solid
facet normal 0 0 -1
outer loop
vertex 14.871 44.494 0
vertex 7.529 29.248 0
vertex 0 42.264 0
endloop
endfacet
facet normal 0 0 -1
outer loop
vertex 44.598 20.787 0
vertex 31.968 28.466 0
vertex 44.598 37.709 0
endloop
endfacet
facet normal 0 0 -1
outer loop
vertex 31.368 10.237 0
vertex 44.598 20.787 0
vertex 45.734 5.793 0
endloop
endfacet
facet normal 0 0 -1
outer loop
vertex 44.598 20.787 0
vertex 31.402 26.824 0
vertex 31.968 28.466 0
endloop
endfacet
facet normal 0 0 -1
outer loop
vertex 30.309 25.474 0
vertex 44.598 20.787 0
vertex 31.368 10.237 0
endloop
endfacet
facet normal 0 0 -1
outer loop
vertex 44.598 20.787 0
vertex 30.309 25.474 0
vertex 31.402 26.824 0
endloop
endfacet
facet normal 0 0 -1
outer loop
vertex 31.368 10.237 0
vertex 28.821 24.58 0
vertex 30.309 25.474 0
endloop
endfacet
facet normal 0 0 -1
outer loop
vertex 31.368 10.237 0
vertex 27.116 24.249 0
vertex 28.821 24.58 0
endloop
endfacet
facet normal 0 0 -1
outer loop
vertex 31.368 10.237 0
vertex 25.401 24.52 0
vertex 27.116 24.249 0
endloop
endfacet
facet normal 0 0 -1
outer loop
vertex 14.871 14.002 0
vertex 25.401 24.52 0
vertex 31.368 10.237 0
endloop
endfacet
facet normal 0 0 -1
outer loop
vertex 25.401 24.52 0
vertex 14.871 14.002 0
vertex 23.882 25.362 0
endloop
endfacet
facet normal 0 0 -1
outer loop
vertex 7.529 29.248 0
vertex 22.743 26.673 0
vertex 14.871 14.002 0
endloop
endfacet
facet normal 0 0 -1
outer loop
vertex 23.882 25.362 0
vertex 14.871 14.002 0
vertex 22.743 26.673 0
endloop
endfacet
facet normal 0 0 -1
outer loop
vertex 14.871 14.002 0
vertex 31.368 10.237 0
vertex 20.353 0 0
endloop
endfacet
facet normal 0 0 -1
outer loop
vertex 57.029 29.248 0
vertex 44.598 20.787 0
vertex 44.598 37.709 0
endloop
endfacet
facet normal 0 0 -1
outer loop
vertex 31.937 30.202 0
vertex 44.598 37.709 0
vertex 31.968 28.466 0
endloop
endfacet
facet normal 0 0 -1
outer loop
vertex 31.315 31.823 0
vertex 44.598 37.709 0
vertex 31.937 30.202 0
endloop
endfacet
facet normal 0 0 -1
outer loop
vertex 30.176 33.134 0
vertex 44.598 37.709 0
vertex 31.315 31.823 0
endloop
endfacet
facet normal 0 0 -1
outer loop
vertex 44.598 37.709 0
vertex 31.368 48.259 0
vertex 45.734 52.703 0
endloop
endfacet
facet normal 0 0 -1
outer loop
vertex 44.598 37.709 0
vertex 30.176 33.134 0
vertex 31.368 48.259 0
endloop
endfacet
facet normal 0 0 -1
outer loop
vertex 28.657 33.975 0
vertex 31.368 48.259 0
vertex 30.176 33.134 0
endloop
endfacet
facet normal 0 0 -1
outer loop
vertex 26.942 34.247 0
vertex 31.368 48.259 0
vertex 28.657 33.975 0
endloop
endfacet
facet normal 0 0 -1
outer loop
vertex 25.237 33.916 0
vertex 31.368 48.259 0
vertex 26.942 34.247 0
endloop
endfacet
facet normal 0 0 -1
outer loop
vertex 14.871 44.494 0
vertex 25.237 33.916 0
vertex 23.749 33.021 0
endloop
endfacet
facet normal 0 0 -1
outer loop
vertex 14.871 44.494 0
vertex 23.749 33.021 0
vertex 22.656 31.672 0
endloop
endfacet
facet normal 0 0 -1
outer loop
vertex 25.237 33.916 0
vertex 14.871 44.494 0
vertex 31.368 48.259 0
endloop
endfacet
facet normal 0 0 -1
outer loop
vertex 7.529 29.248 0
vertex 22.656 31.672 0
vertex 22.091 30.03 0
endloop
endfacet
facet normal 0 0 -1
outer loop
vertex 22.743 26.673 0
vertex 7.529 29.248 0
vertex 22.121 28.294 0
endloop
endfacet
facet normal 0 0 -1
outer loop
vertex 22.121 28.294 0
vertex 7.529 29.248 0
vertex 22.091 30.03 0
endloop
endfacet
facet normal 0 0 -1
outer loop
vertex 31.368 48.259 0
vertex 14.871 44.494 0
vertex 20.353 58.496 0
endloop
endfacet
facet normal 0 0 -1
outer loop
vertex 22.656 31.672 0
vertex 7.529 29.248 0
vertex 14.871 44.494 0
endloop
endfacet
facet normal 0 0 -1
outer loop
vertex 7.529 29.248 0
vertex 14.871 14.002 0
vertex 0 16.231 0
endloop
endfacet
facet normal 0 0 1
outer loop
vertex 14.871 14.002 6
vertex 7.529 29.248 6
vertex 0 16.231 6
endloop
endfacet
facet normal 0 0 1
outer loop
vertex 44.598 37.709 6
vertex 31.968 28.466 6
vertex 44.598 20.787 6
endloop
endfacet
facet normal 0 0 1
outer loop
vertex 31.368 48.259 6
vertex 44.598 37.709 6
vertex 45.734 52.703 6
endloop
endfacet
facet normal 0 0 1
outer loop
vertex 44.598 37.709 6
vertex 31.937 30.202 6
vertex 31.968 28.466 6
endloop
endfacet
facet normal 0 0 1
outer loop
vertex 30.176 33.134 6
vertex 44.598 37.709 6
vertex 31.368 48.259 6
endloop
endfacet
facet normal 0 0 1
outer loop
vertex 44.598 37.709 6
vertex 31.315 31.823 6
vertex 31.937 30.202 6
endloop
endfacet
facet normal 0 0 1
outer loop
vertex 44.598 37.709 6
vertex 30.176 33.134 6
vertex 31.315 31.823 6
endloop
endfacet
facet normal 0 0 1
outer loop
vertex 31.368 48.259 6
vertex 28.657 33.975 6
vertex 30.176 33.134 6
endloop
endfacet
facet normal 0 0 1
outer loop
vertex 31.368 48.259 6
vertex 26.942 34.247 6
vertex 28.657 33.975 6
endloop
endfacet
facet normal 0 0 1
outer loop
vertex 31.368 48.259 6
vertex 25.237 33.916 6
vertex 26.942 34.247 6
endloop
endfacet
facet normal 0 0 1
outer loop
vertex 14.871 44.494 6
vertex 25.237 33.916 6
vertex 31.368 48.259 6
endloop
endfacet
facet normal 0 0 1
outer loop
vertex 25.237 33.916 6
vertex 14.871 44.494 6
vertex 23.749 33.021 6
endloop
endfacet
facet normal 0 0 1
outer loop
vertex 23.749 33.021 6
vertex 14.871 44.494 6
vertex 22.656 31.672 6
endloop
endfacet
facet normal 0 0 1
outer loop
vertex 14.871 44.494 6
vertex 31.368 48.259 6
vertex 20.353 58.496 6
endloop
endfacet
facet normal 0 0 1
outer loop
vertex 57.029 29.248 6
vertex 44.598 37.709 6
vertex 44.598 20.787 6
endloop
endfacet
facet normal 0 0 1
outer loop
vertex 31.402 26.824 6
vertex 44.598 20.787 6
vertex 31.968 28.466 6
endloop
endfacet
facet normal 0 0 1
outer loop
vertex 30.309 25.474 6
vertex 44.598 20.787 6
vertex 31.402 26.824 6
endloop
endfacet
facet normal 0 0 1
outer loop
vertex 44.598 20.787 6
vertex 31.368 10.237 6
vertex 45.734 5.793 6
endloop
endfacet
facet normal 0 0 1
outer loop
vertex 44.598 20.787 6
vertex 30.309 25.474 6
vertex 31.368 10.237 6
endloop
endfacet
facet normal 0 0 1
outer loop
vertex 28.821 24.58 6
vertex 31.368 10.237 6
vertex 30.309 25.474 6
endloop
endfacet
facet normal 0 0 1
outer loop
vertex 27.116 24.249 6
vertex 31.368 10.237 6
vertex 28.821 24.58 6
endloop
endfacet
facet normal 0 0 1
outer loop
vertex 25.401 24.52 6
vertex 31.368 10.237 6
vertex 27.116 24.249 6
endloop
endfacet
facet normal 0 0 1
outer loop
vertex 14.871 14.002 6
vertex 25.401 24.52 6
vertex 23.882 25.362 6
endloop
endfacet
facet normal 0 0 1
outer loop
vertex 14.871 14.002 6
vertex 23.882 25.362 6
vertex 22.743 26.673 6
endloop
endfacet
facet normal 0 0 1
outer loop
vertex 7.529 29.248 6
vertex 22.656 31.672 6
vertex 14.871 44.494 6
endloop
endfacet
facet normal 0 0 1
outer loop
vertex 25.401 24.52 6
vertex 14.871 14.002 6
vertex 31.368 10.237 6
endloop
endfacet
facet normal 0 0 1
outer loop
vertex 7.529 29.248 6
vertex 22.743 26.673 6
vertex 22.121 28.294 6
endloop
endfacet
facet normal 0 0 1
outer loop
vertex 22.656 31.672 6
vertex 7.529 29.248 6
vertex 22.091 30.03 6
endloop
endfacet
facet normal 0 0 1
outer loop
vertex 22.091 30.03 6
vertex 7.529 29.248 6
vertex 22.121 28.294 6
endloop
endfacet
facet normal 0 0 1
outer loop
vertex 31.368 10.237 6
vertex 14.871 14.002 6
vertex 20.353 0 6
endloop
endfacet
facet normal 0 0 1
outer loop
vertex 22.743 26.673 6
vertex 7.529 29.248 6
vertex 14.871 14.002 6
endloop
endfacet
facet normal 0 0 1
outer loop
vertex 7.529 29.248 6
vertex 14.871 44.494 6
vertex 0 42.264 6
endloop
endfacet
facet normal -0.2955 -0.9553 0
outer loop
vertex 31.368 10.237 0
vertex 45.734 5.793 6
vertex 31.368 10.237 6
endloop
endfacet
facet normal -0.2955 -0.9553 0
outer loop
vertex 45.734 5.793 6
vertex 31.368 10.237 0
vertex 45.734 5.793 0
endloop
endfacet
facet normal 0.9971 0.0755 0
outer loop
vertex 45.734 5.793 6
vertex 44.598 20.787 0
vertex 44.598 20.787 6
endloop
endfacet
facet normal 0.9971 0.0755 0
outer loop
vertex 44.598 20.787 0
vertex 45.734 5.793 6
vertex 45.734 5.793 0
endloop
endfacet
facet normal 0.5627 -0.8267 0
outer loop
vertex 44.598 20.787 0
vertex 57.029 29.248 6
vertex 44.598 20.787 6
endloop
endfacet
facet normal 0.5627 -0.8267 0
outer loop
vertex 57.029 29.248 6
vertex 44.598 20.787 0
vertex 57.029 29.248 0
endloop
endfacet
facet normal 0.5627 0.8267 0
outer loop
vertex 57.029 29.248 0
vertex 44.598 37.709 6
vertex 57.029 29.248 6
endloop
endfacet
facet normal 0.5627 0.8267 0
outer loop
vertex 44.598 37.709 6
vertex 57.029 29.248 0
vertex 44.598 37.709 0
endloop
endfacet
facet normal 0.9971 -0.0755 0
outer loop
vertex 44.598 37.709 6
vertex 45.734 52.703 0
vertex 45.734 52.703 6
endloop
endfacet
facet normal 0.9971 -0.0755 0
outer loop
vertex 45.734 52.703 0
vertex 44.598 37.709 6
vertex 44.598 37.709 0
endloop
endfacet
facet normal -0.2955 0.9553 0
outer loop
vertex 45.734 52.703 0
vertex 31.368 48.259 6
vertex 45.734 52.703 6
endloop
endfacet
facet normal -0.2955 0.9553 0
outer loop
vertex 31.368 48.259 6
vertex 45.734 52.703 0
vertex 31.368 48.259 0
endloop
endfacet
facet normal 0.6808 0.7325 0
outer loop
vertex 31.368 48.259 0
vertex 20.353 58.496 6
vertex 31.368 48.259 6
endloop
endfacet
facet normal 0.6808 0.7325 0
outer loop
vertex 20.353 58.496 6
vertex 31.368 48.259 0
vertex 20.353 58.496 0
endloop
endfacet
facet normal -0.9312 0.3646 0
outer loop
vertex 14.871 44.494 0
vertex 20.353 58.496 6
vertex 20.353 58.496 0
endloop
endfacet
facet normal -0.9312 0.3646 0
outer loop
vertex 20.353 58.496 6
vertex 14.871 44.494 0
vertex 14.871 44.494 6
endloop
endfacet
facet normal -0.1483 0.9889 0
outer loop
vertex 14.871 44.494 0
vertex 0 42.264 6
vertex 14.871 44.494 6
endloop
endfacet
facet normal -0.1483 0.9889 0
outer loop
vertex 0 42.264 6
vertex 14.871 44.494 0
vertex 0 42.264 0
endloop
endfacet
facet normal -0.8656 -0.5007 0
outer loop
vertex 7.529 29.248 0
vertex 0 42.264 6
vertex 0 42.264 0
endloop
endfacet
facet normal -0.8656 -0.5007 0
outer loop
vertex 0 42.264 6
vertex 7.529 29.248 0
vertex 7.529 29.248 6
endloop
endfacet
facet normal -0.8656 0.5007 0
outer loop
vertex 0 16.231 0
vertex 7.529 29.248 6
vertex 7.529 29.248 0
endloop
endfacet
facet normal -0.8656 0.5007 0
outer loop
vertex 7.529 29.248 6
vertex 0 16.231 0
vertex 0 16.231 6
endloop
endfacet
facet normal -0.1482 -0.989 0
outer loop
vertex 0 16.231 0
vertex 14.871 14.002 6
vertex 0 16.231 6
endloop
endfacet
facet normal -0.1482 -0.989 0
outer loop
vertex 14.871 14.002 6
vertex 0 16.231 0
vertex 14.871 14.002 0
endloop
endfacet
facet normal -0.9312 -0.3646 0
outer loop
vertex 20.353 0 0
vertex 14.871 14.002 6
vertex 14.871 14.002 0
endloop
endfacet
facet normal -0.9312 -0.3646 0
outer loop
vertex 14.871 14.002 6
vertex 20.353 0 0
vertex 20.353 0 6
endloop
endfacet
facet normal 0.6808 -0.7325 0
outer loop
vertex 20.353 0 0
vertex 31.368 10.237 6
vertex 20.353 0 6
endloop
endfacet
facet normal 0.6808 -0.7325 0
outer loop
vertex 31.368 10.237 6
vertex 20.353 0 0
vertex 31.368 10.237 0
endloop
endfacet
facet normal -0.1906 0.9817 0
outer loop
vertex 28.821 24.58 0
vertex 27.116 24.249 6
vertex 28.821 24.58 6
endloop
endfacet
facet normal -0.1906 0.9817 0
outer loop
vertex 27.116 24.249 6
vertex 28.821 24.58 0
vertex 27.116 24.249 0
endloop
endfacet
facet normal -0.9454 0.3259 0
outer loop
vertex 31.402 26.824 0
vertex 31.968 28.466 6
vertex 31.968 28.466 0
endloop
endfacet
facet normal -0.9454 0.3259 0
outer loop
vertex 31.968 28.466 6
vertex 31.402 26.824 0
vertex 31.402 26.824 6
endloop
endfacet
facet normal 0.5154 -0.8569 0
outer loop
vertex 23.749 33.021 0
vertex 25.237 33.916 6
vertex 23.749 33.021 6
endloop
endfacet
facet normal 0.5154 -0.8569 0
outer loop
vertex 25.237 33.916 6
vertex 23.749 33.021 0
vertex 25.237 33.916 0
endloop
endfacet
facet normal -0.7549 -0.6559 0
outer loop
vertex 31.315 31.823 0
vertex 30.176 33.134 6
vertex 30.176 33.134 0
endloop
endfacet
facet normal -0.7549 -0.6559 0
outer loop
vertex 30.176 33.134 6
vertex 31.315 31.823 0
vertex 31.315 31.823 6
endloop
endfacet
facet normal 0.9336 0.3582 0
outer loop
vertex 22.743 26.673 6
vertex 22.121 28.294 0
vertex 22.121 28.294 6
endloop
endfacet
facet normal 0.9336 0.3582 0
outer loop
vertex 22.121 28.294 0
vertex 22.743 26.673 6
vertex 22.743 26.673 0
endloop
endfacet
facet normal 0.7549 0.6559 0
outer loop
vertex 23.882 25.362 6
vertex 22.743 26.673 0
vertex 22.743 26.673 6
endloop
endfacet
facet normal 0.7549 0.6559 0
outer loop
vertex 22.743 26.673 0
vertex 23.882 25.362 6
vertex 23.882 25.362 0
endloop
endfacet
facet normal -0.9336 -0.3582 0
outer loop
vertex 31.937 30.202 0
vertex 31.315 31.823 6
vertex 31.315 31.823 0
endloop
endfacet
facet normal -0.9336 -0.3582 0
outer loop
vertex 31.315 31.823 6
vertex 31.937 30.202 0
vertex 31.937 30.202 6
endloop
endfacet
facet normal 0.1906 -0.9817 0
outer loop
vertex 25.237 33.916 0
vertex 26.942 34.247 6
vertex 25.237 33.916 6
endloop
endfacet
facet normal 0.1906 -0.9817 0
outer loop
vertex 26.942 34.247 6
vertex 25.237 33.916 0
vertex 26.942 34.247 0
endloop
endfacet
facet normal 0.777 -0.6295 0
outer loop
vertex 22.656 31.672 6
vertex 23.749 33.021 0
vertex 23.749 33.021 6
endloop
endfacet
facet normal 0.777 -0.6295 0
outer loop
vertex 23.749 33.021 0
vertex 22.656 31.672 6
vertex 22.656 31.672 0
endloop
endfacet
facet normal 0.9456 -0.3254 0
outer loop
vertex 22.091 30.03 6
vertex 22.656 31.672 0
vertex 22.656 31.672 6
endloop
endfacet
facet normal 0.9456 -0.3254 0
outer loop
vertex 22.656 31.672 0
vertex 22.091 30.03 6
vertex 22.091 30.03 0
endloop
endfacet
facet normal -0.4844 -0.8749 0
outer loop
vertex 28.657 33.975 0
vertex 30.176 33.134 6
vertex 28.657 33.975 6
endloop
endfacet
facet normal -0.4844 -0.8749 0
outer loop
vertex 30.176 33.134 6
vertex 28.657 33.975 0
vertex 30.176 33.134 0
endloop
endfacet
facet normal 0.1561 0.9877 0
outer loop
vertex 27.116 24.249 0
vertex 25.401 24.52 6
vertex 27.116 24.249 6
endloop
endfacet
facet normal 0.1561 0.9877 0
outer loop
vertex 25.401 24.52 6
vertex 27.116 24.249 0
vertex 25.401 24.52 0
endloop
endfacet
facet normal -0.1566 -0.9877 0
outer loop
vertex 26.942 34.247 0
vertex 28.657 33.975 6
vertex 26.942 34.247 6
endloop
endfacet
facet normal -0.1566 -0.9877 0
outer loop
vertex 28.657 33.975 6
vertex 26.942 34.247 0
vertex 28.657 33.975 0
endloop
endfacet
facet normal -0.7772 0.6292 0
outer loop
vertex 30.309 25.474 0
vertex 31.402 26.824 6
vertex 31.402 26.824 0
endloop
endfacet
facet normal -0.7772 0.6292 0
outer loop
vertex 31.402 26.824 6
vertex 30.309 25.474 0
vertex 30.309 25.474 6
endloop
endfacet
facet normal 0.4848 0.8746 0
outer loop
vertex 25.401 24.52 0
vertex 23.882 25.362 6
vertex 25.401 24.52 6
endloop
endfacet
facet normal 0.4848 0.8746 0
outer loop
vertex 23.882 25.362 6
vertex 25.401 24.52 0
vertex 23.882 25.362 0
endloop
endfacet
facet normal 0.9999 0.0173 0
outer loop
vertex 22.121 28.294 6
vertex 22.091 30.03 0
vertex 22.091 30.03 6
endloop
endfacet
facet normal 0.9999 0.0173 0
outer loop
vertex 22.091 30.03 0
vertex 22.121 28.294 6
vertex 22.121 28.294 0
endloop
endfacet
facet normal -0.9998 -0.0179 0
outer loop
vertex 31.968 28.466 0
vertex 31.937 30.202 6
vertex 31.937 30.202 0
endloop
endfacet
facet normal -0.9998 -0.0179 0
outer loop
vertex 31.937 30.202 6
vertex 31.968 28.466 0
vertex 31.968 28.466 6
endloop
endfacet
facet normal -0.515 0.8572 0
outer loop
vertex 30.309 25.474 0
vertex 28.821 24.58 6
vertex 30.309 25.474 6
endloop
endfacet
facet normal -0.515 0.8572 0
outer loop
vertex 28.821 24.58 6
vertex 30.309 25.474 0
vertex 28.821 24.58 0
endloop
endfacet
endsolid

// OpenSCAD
$fn = 32;

// ----------------------------------------------------------------------
// Star wheel: 7-point blunt, R30
// ----------------------------------------------------------------------

// --- parameters (mm) ---
n_points = 7;             // number of points / teeth
r_out = 30;               // tip radius
r_in = 19.5;              // root radius
bore_r = 5;               // centre bore radius
plate_t = 6;              // plate thickness, Z (extrusion height)
bore_d = 10;              // centre bore diameter

profile = [[57.029, 29.248], [44.598, 37.709], [45.734, 52.703], [31.368, 48.259], [20.353, 58.496], [14.871, 44.494], [0, 42.264], [7.529, 29.248], [0, 16.231], [14.871, 14.002], [20.353, 0], [31.368, 10.237], [45.734, 5.793], [44.598, 20.787]];  // primary outline, 14 points, counter clockwise
void_1 = [[31.937, 30.202], [31.315, 31.823], [30.176, 33.134], [28.657, 33.975], [26.942, 34.247], [25.237, 33.916], [23.749, 33.021], [22.656, 31.672], [22.091, 30.03], [22.121, 28.294], [22.743, 26.673], [23.882, 25.362], [25.401, 24.52], [27.116, 24.249], [28.821, 24.58], [30.309, 25.474], [31.402, 26.824], [31.968, 28.466]];  // centre bore, 18 points

// --- the one profile operation ---
difference() {
  linear_extrude(height = plate_t) polygon(points = profile);
  translate([0, 0, -1])
    linear_extrude(height = plate_t + 2) polygon(points = void_1);
}
